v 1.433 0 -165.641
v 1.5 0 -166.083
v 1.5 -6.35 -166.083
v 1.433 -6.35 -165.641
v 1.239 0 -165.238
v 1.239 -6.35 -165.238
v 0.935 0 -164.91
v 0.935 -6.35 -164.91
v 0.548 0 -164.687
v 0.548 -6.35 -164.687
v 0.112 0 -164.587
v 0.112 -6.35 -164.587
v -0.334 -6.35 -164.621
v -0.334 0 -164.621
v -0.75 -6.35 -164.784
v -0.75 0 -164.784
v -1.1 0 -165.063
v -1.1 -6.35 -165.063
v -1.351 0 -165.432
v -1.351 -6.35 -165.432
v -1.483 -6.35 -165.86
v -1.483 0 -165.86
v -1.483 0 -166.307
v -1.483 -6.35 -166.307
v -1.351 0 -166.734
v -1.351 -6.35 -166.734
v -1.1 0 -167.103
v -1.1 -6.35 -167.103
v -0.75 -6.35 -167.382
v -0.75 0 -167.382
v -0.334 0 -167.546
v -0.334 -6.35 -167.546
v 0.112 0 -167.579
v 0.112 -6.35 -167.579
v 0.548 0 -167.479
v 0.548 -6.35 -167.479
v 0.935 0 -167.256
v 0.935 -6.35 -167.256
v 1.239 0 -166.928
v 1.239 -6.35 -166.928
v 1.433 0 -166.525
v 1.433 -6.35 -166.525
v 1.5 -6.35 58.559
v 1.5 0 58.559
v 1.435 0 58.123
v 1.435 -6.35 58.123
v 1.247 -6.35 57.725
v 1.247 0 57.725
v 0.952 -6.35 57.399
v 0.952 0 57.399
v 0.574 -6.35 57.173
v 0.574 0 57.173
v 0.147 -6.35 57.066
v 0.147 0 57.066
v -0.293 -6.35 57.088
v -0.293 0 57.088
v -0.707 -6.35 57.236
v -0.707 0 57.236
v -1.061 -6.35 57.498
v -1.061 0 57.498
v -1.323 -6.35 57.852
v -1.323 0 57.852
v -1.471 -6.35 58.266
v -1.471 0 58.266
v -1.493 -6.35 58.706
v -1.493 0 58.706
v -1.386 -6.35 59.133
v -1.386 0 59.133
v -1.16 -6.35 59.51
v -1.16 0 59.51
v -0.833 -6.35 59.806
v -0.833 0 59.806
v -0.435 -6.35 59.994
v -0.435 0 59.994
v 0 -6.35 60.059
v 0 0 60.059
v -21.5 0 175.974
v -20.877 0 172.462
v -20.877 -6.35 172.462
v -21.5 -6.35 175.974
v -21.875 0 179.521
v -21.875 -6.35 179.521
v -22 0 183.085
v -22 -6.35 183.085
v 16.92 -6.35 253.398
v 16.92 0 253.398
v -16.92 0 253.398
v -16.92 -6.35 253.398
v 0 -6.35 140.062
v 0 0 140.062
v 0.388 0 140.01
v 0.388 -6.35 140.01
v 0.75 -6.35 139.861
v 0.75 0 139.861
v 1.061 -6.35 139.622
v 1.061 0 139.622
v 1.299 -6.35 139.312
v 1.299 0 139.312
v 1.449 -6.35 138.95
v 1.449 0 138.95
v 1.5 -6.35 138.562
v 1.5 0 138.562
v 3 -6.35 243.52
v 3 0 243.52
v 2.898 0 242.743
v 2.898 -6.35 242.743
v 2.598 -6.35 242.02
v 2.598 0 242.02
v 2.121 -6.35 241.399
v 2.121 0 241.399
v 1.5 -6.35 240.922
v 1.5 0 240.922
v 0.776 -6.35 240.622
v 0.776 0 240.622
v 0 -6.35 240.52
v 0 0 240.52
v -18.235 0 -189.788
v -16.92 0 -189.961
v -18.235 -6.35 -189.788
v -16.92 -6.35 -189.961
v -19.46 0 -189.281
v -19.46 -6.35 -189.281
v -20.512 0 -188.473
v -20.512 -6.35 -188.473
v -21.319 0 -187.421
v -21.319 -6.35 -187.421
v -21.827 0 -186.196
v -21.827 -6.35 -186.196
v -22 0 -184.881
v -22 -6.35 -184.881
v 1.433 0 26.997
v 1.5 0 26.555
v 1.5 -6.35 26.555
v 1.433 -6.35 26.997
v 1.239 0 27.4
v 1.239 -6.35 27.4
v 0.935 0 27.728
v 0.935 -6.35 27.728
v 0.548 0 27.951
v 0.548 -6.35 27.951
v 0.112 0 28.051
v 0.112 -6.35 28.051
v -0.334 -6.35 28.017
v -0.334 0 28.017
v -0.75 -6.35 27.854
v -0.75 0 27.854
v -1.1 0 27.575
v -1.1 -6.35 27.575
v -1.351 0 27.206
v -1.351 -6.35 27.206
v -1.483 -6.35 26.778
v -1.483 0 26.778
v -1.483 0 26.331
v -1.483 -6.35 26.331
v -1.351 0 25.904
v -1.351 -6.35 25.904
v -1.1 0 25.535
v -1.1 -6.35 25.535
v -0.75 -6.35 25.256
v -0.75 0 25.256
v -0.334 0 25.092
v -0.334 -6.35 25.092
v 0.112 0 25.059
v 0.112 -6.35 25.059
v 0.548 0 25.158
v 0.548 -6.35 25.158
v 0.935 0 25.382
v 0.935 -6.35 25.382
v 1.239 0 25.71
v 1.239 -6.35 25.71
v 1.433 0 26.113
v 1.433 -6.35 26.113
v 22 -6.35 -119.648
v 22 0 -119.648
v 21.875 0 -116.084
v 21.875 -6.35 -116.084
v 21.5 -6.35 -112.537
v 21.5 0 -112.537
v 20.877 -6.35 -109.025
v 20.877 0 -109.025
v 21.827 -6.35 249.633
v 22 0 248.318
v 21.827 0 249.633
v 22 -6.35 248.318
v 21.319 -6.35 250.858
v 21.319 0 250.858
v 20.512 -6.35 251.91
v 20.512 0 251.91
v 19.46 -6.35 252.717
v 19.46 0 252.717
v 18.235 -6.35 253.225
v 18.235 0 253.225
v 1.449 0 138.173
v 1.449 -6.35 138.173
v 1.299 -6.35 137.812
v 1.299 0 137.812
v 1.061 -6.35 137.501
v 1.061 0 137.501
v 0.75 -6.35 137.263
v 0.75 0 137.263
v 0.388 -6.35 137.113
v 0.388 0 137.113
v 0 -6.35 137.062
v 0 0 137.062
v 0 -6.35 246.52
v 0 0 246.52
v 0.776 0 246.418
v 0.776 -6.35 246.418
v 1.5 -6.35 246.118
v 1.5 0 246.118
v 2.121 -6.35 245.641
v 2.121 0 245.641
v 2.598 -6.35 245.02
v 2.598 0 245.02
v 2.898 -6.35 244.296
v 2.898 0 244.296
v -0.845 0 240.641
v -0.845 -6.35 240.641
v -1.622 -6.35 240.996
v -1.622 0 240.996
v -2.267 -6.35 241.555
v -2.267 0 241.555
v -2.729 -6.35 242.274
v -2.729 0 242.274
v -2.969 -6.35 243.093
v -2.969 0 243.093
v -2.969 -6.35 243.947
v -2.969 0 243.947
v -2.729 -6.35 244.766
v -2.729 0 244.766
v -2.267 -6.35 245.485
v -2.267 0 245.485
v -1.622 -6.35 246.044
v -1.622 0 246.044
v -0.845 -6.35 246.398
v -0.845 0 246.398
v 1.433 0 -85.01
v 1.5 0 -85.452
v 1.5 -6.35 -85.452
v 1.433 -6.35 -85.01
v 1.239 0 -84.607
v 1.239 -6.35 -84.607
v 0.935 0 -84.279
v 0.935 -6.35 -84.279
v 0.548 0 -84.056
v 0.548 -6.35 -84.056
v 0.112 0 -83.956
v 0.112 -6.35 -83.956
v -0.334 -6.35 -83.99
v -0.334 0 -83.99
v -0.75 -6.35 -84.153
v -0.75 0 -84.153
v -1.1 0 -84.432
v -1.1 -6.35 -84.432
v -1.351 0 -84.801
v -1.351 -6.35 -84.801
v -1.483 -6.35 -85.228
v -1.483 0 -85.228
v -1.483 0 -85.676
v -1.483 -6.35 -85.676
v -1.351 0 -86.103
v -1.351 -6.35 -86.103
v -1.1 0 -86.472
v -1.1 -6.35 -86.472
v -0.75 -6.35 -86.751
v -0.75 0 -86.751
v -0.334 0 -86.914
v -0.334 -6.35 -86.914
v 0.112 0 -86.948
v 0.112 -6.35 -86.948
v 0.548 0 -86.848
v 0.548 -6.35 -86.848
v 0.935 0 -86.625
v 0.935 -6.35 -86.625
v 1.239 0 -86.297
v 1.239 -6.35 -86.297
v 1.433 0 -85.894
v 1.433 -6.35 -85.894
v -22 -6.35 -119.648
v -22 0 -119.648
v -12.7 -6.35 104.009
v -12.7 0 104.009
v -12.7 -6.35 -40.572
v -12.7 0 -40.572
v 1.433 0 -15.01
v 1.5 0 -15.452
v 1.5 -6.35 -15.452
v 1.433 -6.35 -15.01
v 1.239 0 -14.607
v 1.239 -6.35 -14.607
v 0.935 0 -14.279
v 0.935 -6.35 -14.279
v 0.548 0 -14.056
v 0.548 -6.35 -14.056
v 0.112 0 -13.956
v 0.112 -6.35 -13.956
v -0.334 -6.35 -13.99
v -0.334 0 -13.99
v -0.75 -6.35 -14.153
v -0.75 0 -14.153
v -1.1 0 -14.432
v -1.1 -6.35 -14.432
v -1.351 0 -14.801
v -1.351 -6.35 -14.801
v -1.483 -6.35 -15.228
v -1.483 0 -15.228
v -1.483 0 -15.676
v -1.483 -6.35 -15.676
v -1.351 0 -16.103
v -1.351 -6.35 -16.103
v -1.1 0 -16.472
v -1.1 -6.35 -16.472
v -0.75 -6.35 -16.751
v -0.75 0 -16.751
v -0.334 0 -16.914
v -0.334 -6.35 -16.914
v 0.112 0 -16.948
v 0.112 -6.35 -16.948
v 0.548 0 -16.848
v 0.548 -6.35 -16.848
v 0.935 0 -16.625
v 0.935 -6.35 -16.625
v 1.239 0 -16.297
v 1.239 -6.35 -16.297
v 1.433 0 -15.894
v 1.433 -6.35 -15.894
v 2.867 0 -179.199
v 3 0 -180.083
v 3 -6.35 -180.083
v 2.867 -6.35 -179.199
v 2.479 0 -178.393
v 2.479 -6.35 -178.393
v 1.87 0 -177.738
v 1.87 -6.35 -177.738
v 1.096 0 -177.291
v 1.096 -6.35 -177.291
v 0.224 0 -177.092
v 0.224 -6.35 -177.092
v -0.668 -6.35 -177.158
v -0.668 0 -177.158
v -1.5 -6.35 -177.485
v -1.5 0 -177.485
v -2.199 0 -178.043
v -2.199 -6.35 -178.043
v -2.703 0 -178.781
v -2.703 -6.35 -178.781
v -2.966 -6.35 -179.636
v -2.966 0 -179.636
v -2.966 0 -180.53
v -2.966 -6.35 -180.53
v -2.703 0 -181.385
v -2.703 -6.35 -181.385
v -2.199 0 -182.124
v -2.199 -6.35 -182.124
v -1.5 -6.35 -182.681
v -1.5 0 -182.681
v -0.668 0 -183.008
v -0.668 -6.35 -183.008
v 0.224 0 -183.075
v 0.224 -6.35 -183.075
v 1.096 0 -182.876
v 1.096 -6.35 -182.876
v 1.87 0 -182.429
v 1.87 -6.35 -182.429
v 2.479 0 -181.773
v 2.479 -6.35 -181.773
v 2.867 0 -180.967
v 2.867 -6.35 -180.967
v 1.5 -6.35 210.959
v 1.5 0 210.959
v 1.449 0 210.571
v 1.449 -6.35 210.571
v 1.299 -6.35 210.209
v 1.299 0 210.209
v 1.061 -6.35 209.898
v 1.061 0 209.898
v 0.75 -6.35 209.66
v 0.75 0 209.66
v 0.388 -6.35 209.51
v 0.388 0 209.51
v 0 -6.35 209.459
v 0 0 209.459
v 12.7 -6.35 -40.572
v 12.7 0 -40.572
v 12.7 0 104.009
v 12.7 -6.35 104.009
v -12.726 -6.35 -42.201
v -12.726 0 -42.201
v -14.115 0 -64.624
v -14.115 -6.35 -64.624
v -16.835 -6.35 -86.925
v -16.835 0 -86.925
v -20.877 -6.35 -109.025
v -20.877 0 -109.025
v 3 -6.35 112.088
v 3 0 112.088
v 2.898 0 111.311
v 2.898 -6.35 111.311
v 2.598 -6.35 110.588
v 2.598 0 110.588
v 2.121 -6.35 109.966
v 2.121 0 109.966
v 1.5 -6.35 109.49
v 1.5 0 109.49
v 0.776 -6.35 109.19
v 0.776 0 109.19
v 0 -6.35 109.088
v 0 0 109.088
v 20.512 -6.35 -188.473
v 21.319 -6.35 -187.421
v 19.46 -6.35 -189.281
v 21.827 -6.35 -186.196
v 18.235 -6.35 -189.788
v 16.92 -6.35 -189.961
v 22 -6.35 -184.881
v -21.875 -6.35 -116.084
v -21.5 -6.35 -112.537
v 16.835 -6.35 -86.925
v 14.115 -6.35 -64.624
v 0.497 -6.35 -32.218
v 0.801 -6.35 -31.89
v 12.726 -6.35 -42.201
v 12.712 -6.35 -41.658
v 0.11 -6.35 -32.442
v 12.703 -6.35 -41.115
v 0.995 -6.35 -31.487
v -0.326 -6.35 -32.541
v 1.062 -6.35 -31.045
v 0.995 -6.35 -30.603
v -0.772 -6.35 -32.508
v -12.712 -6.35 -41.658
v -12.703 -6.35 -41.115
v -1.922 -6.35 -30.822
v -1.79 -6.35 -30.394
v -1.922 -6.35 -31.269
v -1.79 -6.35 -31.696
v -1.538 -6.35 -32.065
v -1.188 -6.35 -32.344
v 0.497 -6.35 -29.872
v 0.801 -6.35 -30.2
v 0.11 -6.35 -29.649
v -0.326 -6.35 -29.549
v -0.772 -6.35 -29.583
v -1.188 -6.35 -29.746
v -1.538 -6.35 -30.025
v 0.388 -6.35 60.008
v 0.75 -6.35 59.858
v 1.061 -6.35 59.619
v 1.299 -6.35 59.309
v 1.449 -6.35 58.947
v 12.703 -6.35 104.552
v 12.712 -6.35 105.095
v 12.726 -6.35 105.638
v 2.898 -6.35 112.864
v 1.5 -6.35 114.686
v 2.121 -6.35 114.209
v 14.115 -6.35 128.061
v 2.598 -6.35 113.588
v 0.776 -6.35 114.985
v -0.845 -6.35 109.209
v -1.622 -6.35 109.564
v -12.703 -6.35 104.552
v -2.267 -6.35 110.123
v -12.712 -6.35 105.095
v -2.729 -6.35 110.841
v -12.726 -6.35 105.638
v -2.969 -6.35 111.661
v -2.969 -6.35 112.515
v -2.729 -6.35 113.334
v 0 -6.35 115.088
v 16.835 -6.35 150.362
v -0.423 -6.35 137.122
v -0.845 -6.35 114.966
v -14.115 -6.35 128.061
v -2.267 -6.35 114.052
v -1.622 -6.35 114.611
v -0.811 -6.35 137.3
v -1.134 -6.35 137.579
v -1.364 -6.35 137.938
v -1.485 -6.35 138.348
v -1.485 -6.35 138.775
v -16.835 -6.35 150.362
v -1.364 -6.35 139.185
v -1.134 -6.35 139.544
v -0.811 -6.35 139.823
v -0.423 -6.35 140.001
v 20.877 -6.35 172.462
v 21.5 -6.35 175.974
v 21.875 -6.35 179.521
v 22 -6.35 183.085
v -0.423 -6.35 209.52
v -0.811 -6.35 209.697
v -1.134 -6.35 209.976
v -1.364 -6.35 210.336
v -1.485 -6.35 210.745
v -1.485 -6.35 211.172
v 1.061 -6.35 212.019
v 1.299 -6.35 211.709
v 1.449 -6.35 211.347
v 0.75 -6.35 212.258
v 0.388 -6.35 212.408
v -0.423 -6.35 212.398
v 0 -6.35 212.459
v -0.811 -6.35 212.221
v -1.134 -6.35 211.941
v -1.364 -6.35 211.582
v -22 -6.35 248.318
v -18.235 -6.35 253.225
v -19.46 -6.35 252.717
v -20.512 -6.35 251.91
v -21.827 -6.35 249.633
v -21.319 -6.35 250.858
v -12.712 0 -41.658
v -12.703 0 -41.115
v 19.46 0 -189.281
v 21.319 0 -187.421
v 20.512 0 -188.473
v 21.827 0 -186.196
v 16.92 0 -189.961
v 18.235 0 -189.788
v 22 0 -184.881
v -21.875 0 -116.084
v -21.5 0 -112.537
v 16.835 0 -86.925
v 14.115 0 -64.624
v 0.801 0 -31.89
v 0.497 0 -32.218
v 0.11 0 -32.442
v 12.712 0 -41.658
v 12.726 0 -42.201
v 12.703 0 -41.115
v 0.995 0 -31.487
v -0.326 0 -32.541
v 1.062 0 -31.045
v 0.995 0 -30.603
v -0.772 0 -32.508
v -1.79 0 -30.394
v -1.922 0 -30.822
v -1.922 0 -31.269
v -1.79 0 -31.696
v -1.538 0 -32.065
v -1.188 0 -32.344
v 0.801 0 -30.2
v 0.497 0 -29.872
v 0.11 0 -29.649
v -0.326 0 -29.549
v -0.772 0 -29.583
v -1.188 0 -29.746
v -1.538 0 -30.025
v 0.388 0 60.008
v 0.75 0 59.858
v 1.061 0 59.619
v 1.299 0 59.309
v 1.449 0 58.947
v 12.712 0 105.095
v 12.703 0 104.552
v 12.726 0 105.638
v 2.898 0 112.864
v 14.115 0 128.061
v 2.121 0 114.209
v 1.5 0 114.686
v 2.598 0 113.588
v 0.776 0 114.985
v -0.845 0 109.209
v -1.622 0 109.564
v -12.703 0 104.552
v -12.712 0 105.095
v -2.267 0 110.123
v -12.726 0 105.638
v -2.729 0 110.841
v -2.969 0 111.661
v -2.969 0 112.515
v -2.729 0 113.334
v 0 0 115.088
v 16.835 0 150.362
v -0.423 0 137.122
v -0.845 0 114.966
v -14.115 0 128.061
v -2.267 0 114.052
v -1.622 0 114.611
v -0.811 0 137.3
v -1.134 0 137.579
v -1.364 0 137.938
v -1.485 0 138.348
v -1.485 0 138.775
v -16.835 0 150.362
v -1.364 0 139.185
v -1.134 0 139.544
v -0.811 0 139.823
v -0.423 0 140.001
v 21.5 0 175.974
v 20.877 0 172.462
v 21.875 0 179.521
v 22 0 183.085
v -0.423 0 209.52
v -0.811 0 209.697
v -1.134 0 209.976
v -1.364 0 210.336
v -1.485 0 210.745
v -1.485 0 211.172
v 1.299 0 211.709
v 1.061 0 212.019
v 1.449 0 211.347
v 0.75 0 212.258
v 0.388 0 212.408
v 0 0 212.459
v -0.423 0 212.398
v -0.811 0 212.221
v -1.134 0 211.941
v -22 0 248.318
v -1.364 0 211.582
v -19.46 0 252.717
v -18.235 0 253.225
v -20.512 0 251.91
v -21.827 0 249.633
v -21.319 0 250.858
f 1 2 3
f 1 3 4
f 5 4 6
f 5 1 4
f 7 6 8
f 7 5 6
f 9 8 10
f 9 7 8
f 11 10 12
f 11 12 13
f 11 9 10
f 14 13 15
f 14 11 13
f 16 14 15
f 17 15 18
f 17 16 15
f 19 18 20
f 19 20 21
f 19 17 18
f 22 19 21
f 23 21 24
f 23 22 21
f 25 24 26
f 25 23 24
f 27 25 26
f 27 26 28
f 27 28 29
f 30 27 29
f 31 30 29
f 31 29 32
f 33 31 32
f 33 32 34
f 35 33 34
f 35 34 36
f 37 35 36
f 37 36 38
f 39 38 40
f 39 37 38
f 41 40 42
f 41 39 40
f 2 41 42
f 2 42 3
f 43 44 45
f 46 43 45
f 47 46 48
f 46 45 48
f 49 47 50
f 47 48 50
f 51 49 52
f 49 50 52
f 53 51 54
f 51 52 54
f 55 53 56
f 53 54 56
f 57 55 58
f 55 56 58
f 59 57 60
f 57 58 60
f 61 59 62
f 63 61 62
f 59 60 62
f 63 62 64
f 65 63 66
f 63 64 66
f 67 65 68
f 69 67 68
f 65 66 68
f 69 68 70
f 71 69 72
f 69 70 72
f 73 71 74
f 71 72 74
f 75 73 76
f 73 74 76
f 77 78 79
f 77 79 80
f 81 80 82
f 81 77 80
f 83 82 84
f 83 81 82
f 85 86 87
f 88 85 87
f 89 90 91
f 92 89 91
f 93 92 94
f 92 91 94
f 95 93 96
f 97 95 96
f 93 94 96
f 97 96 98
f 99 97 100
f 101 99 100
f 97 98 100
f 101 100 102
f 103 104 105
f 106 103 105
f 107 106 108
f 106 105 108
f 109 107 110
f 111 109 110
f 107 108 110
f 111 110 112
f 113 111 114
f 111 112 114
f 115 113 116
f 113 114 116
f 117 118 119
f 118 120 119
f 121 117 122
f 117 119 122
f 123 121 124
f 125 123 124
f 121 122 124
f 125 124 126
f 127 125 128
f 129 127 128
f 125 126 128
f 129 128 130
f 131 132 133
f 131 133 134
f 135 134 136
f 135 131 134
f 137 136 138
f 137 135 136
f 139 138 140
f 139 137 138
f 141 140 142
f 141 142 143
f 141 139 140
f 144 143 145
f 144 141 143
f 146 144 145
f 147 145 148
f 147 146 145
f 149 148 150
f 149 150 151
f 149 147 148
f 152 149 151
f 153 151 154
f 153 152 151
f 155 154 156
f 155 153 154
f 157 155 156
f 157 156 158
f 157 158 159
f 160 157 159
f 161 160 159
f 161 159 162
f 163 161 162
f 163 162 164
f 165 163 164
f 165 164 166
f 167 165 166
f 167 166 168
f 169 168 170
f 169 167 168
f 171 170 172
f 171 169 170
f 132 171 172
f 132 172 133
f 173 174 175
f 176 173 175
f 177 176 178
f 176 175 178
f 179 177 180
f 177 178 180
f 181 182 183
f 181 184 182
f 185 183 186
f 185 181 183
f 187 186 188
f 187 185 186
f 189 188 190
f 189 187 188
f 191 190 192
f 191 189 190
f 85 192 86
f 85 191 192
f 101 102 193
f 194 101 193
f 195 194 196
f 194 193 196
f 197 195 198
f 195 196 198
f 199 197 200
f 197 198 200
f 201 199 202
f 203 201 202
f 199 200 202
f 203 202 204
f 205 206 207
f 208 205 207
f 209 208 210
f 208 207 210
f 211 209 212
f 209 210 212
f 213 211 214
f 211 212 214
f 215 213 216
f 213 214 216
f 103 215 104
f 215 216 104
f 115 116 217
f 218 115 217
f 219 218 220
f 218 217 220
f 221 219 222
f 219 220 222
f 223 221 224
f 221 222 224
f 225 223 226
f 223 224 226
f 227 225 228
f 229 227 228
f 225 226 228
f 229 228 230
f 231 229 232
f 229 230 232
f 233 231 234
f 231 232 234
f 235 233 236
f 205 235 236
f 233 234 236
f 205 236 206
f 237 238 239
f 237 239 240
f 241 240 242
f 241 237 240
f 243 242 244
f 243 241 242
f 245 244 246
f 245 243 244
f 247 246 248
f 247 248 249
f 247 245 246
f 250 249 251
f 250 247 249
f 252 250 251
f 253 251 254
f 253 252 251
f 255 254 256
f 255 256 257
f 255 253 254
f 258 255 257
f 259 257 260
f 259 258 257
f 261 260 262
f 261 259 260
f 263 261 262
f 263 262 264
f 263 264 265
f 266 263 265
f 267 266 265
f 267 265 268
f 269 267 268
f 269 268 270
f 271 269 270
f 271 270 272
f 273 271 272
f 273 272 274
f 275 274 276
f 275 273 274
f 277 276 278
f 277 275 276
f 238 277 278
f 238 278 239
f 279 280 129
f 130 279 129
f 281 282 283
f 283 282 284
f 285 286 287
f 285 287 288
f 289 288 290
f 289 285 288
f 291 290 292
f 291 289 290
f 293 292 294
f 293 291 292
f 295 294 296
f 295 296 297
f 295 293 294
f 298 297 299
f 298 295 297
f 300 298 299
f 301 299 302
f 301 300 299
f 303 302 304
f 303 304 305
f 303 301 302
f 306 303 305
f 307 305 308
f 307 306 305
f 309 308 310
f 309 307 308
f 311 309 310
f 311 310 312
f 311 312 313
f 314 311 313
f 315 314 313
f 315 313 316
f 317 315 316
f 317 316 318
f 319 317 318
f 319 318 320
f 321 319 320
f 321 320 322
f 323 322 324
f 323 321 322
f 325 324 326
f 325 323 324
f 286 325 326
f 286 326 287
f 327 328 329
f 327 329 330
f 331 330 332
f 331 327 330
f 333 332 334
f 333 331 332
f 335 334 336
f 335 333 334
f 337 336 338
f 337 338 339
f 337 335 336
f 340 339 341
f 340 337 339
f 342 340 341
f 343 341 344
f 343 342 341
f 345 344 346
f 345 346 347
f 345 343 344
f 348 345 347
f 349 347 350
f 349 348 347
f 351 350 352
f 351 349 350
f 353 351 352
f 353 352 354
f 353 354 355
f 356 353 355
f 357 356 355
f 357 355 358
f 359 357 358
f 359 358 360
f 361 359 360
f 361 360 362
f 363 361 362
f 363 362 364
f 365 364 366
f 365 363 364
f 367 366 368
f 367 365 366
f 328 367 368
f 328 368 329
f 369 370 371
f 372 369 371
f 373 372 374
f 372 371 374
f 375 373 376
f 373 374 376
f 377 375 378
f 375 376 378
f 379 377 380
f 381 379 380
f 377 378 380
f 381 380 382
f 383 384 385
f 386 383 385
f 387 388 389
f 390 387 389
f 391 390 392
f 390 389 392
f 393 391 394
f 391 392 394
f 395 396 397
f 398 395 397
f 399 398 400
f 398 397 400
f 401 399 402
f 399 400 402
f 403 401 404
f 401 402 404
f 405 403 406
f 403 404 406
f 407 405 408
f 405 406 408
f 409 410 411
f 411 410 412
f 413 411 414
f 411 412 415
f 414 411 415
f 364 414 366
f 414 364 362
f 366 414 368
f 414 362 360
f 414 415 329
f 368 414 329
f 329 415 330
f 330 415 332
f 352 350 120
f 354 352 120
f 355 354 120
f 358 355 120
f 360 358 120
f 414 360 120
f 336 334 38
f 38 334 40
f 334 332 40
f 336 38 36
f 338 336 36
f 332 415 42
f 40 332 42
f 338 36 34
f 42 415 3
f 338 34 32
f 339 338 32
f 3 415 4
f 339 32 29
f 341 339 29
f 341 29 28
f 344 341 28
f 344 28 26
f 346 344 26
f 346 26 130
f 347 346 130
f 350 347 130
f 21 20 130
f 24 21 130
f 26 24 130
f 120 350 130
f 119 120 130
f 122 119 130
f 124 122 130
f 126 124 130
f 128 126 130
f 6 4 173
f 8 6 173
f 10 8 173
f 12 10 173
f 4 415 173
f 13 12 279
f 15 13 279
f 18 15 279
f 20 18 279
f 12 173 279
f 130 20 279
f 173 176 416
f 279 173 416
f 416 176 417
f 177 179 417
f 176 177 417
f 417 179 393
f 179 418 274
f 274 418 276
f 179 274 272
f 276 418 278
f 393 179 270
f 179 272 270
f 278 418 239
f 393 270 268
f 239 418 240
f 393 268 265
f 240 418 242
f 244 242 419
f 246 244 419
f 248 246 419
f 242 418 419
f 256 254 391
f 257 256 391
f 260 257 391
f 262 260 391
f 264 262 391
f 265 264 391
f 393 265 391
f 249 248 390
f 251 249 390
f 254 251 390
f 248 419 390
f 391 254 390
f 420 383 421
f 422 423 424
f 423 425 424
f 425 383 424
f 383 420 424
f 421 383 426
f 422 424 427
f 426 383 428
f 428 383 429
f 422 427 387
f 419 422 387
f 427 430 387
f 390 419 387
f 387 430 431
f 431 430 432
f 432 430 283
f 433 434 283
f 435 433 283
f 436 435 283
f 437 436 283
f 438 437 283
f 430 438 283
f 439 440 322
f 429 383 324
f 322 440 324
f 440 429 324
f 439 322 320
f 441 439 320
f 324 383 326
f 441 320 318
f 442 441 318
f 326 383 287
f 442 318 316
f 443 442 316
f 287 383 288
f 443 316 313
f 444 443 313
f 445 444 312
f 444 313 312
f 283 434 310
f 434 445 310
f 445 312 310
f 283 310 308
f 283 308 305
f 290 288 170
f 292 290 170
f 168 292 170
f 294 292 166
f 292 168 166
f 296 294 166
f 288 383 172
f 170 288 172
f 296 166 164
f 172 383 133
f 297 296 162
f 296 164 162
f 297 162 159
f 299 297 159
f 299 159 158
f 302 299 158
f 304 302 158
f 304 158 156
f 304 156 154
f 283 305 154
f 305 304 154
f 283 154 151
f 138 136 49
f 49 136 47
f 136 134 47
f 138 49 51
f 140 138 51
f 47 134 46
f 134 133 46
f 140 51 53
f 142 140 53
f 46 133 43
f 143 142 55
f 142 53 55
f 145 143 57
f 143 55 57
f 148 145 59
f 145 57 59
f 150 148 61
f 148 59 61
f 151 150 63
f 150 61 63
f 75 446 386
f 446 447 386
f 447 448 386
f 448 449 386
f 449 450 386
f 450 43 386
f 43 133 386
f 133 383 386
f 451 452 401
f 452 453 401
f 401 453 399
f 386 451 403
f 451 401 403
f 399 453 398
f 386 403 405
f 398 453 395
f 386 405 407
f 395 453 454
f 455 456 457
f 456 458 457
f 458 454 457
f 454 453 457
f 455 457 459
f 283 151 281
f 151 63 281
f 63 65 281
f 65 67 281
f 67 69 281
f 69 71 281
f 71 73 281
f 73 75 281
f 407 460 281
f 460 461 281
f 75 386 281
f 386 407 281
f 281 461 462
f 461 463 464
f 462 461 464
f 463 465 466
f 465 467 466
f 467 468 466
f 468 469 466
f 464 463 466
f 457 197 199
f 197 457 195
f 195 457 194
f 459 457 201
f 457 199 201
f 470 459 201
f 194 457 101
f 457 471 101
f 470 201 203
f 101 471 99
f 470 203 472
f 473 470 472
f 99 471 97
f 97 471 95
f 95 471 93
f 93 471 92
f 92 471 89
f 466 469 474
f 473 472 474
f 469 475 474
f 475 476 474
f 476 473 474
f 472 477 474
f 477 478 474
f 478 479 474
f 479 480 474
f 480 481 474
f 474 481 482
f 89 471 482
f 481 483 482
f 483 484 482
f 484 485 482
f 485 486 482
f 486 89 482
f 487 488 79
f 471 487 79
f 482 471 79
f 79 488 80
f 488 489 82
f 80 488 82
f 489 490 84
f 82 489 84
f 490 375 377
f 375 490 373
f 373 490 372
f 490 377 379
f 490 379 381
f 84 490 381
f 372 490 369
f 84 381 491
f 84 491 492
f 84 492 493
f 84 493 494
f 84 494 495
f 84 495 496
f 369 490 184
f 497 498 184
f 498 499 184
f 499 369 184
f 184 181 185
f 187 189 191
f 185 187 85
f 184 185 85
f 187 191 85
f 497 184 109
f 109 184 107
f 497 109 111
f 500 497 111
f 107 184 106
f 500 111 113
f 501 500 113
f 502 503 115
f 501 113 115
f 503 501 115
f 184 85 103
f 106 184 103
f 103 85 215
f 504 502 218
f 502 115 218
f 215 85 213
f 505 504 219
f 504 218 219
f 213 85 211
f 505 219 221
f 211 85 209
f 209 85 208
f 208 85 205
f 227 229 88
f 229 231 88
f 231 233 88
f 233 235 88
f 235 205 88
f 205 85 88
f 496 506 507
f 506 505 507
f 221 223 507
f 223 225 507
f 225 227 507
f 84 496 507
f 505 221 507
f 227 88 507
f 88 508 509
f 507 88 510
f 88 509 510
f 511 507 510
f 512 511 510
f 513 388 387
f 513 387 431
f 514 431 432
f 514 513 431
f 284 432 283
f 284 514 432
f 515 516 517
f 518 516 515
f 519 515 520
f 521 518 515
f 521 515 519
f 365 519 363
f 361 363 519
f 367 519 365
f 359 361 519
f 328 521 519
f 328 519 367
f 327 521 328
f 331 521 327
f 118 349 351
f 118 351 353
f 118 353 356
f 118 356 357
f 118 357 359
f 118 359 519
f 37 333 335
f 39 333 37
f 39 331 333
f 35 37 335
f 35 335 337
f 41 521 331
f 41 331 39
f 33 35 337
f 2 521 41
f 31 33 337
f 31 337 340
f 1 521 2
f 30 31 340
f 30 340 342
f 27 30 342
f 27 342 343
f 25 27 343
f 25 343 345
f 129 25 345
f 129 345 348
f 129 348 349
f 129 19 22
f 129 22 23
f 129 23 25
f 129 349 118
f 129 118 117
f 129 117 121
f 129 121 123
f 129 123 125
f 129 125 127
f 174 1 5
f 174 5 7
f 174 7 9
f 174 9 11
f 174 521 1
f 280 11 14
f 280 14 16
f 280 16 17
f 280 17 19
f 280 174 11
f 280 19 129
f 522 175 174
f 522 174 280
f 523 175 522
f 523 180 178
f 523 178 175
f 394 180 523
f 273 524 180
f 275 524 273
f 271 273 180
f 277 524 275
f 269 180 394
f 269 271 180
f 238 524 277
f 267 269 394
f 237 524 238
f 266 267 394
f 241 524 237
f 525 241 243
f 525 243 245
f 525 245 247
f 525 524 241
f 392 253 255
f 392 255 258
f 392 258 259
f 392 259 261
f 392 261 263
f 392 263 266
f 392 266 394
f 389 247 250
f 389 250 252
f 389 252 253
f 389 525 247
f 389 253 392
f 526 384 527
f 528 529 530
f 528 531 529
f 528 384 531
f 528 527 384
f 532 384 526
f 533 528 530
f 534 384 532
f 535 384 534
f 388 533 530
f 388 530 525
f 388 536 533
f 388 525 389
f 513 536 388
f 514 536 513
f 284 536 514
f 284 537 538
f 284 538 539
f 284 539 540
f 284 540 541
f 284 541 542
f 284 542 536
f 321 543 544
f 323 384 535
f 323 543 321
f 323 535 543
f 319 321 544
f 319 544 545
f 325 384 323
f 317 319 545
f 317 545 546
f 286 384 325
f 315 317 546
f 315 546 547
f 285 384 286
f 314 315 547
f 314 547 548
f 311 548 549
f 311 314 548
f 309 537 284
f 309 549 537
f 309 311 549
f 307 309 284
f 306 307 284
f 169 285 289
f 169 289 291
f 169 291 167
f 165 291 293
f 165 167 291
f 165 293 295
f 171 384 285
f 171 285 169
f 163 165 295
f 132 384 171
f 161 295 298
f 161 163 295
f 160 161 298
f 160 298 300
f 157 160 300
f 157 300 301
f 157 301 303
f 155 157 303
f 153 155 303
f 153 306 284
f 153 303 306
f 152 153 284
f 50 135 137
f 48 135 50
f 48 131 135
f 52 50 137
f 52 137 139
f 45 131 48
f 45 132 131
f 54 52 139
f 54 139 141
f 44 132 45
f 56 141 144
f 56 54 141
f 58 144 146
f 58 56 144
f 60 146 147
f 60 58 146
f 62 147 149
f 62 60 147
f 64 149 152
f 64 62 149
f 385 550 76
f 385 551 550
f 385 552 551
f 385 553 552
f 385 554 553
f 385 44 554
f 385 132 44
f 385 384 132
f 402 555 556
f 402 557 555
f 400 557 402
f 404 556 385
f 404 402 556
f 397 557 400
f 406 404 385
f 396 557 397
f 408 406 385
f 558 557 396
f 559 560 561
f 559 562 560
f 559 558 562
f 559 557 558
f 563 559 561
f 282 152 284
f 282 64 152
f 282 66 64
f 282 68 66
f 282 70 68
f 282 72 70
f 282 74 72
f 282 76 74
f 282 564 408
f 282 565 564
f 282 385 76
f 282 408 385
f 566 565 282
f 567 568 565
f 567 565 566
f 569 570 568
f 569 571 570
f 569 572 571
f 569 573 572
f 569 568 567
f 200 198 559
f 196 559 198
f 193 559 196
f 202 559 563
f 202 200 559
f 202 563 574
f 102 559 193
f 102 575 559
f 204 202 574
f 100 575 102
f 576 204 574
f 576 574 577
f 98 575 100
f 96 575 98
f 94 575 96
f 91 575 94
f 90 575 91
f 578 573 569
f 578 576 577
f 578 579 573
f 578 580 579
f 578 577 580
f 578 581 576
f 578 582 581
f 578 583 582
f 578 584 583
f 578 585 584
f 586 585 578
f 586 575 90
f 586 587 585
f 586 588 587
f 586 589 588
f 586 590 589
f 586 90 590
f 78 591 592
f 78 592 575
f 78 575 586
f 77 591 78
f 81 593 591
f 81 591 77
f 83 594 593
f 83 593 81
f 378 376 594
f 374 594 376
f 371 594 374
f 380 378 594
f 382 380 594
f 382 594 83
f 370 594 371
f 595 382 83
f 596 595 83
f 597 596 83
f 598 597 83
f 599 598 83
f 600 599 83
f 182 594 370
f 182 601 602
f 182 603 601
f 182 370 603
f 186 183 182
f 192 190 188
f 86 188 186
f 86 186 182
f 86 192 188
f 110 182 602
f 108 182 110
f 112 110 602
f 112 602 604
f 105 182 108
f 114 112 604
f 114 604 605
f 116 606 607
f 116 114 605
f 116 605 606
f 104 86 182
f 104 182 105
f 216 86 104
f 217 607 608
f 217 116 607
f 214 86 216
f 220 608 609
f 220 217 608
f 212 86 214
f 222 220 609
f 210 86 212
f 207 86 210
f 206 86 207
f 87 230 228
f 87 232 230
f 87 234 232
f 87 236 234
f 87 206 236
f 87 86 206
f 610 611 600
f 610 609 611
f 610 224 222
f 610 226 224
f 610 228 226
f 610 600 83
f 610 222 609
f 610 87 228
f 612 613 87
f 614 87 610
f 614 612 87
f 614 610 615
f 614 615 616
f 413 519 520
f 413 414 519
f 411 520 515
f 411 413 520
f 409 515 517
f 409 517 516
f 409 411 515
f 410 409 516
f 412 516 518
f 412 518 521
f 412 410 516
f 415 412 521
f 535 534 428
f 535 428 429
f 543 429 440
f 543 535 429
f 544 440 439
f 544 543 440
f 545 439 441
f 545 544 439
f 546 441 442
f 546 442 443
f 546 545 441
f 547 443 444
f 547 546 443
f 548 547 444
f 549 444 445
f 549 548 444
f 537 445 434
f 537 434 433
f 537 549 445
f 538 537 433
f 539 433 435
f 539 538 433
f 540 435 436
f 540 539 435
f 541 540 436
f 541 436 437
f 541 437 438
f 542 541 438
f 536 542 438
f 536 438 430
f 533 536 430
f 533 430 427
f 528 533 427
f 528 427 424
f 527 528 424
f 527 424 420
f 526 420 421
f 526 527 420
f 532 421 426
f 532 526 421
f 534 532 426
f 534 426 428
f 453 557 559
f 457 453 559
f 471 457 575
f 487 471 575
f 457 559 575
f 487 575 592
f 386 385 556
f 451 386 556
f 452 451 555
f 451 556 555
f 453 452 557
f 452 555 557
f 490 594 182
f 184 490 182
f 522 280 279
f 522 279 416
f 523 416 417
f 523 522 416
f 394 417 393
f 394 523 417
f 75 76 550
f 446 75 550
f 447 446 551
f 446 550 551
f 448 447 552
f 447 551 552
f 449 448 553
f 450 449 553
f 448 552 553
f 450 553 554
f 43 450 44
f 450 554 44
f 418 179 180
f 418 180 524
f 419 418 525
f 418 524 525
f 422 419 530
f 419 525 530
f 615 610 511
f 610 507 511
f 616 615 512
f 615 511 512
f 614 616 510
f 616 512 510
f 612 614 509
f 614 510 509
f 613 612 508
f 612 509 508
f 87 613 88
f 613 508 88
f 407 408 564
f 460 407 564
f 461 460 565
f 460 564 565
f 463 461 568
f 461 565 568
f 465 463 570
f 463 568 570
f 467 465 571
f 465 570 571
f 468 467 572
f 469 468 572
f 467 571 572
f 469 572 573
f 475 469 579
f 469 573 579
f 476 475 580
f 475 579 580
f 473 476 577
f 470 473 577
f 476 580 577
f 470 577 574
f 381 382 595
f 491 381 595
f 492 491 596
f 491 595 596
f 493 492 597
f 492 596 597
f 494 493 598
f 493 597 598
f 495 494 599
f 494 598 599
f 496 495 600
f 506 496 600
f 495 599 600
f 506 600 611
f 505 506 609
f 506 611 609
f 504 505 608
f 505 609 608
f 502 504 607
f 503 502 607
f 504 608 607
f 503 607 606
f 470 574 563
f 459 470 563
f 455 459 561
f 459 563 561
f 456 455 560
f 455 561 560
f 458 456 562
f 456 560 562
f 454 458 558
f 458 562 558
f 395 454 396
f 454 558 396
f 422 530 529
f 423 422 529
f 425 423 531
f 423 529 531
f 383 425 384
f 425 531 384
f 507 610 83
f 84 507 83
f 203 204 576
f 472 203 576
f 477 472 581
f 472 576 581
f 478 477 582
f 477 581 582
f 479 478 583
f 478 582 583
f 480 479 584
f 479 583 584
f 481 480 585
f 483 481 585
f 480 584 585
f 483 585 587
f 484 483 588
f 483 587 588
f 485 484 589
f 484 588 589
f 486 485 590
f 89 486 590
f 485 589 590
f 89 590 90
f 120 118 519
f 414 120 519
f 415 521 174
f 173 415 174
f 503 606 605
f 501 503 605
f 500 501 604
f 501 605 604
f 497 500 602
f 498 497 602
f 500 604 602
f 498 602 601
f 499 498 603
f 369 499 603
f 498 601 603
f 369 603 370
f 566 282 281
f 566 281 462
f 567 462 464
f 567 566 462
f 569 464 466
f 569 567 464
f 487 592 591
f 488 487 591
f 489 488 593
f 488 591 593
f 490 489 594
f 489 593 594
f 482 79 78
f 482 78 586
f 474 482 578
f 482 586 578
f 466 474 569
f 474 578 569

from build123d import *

# Parameters (mm, degrees)
F0_R        = 1.5
F0_R_2      = 3
F1_DEPTH    = 6.35
F2_R        = 5.08
F3_T1_DEPTH = 6.35
F3_T3_DEPTH = 34.0624500619


# Not quite as in the source:
# - a fillet or chamfer that OpenCascade refuses, or shapes differently, is made with other operations: its cross-section is extruded or revolved along the edge and cut away or added
# - a feature names something its author has since deleted; it is built from what else it names


with BuildPart() as f1:
    # F0 (on Front) → F1 (new body)
    with BuildSketch(Plane.XZ):
        with BuildLine():
            Line((-22, -189.9611499309), (-4.6853246795, -189.9611499309))
            Line((-4.6853246795, -189.9611499309), (0, -189.9611499309))
            Line((0, -189.9611499309), (4.6853246795, -189.9611499309))
            Line((4.6853246795, -189.9611499309), (22, -189.9611499309))
            Line((22, -189.9611499309), (22, -172.8709284505))
            Line((22, -172.8709284505), (22, -161.9910197589))
            Line((22, -161.9910197589), (22, -114.1058849427))
            ThreePointArc((22, -114.1058849427), (15.5787747464, -77.9579307824), (12.7, -41.3571195934))
            Line((12.7, -41.3571195934), (12.7, 104.7939062119))
            ThreePointArc((12.7, 104.7939062119), (15.5787747464, 141.3947174009), (22, 177.5426715612))
            Line((22, 177.5426715612), (22, 225.4278063774))
            Line((22, 225.4278063774), (22, 236.307715069))
            Line((22, 236.307715069), (22, 253.3979365494))
            Line((22, 253.3979365494), (4.6853246795, 253.3979365494))
            Line((4.6853246795, 253.3979365494), (0, 253.3979365494))
            Line((0, 253.3979365494), (-4.6853246795, 253.3979365494))
            Line((-4.6853246795, 253.3979365494), (-22, 253.3979365494))
            Line((-22, 253.3979365494), (-22, 236.307715069))
            Line((-22, 236.307715069), (-22, 225.4278063774))
            Line((-22, 225.4278063774), (-22, 177.5426715612))
            ThreePointArc((-22, 177.5426715612), (-15.5787747464, 141.3947174009), (-12.7, 104.7939062119))
            Line((-12.7, 104.7939062119), (-12.7, -41.3571195934))
            ThreePointArc((-12.7, -41.3571195934), (-15.5787747464, -77.9579307824), (-22, -114.1058849427))
            Line((-22, -114.1058849427), (-22, -161.9910197589))
            Line((-22, -161.9910197589), (-22, -172.8709284505))
            Line((-22, -172.8709284505), (-22, -189.9611499309))
        make_face()
        with Locations((-0.4384766798, -31.0452261312)):
            Circle(F0_R, mode=Mode.SUBTRACT)
        with Locations((0, -180.0831407309)):
            Circle(F0_R_2, mode=Mode.SUBTRACT)
        with Locations((0, -166.0831407309)):
            Circle(F0_R, mode=Mode.SUBTRACT)
        with Locations((0, -85.4520261312)):
            Circle(F0_R, mode=Mode.SUBTRACT)
        with Locations((0, -15.4520261312)):
            Circle(F0_R, mode=Mode.SUBTRACT)
        with Locations((0, 26.5547856688)):
            Circle(F0_R, mode=Mode.SUBTRACT)
        with BuildLine():
            ThreePointArc((1.5, 58.5587856688), (-1.0606601718, 57.4981254971), (0, 60.0587856688))
            ThreePointArc((0, 60.0587856688), (1.0606601718, 59.6194458406), (1.5, 58.5587856688))
        make_face(mode=Mode.SUBTRACT)
        with BuildLine():
            ThreePointArc((0, 109.0876222849), (-3, 112.0876222849), (0, 115.0876222849))
            ThreePointArc((0, 115.0876222849), (2.1213203436, 114.2089426284), (3, 112.0876222849))
            ThreePointArc((3, 112.0876222849), (2.1213203436, 109.9663019413), (0, 109.0876222849))
        make_face(mode=Mode.SUBTRACT)
        with BuildLine():
            ThreePointArc((0, 137.0615974688), (-1.5, 138.5615974688), (0, 140.0615974688))
            ThreePointArc((0, 140.0615974688), (1.0606601718, 139.6222576406), (1.5, 138.5615974688))
            ThreePointArc((1.5, 138.5615974688), (1.0606601718, 137.5009372971), (0, 137.0615974688))
        make_face(mode=Mode.SUBTRACT)
        with BuildLine():
            ThreePointArc((0, 209.4587856688), (-1.5, 210.9587856688), (0, 212.4587856688))
            ThreePointArc((0, 212.4587856688), (1.0606601718, 212.0194458406), (1.5, 210.9587856688))
            ThreePointArc((1.5, 210.9587856688), (1.0606601718, 209.8981254971), (0, 209.4587856688))
        make_face(mode=Mode.SUBTRACT)
        with BuildLine():
            ThreePointArc((0, 240.5199192026), (-3, 243.5199192026), (0, 246.5199192026))
            ThreePointArc((0, 246.5199192026), (2.1213203436, 245.6412395461), (3, 243.5199192026))
            ThreePointArc((3, 243.5199192026), (2.1213203436, 241.398598859), (0, 240.5199192026))
        make_face(mode=Mode.SUBTRACT)
    extrude(amount=F1_DEPTH)

    # F2
    f2_edges = [f1.edges().sort_by_distance(p)[0] for p in [
        (-22, -3.175, 253.397937),
        (22, -3.175, 253.397937),
        (22, -3.175, -189.96115),
        (-22, -3.175, -189.96115),
    ]]
    fillet(f2_edges, radius=F2_R)

    # F3: fillet of radius 50.8 on 8 edges, made by hand

    # F3_s2 → F3_t1 (join)
    with BuildSketch(Plane.XZ):
        with BuildLine():
            ThreePointArc((-12.7, 104.0086355302), (-12.7065317021, 104.8232386677), (-12.7261251288, 105.6376323271))
            ThreePointArc((-12.7261251288, 105.6376323271), (-12.7128266876, 105.2157765732), (-12.7, 104.7939062119))
            Line((-12.7, 104.7939062119), (-12.7, 104.0086355302))
        make_face()
        with BuildLine():
            ThreePointArc((12.7, 104.0086355302), (12.7065317021, 104.8232386677), (12.7261251288, 105.6376323271))
            ThreePointArc((12.7261251288, 105.6376323271), (12.7128266876, 105.2157765732), (12.7, 104.7939062119))
            Line((12.7, 104.7939062119), (12.7, 104.0086355302))
        make_face()
        with BuildLine():
            ThreePointArc((12.7261251288, -42.2008457086), (12.7065317021, -41.3864520492), (12.7, -40.5718489117))
            Line((12.7, -40.5718489117), (12.7, -41.3571195934))
            ThreePointArc((12.7, -41.3571195934), (12.7128266876, -41.7789899547), (12.7261251288, -42.2008457086))
        make_face()
        with BuildLine():
            ThreePointArc((-12.7261251288, -42.2008457086), (-12.7065317021, -41.3864520492), (-12.7, -40.5718489116))
            Line((-12.7, -40.5718489116), (-12.7, -41.3571195934))
            ThreePointArc((-12.7, -41.3571195934), (-12.7128266876, -41.7789899547), (-12.7261251288, -42.2008457086))
        make_face()
    extrude(amount=F3_T1_DEPTH)

    # F3_s4 → F3_t3 (cut)
    with BuildSketch(Plane.XZ.offset(-13.856225031)):
        with BuildLine():
            ThreePointArc((-22, -119.6483749551), (-21.7184280188, -114.3071737314), (-20.8768334444, -109.025182453))
            ThreePointArc((-20.8768334444, -109.025182453), (-21.429661091, -111.5674692633), (-22, -114.1058849427))
            Line((-22, -114.1058849427), (-22, -119.6483749551))
        make_face()
        with BuildLine():
            ThreePointArc((22, -119.6483749551), (21.7184280188, -114.3071737314), (20.8768334444, -109.025182453))
            ThreePointArc((20.8768334444, -109.025182453), (21.429661091, -111.5674692633), (22, -114.1058849427))
            Line((22, -114.1058849427), (22, -119.6483749551))
        make_face()
        with BuildLine():
            ThreePointArc((20.8768334444, 172.4619690715), (21.7184280188, 177.7439603499), (22, 183.0851615736))
            Line((22, 183.0851615736), (22, 177.5426715612))
            ThreePointArc((22, 177.5426715612), (21.429661091, 175.0042558818), (20.8768334444, 172.4619690715))
        make_face()
        with BuildLine():
            ThreePointArc((-20.8768334444, 172.4619690715), (-21.7184280188, 177.7439603499), (-22, 183.0851615736))
            Line((-22, 183.0851615736), (-22, 177.5426715612))
            ThreePointArc((-22, 177.5426715612), (-21.429661091, 175.0042558818), (-20.8768334444, 172.4619690715))
        make_face()
    extrude(amount=F3_T3_DEPTH, mode=Mode.SUBTRACT)


solid = f1.part
